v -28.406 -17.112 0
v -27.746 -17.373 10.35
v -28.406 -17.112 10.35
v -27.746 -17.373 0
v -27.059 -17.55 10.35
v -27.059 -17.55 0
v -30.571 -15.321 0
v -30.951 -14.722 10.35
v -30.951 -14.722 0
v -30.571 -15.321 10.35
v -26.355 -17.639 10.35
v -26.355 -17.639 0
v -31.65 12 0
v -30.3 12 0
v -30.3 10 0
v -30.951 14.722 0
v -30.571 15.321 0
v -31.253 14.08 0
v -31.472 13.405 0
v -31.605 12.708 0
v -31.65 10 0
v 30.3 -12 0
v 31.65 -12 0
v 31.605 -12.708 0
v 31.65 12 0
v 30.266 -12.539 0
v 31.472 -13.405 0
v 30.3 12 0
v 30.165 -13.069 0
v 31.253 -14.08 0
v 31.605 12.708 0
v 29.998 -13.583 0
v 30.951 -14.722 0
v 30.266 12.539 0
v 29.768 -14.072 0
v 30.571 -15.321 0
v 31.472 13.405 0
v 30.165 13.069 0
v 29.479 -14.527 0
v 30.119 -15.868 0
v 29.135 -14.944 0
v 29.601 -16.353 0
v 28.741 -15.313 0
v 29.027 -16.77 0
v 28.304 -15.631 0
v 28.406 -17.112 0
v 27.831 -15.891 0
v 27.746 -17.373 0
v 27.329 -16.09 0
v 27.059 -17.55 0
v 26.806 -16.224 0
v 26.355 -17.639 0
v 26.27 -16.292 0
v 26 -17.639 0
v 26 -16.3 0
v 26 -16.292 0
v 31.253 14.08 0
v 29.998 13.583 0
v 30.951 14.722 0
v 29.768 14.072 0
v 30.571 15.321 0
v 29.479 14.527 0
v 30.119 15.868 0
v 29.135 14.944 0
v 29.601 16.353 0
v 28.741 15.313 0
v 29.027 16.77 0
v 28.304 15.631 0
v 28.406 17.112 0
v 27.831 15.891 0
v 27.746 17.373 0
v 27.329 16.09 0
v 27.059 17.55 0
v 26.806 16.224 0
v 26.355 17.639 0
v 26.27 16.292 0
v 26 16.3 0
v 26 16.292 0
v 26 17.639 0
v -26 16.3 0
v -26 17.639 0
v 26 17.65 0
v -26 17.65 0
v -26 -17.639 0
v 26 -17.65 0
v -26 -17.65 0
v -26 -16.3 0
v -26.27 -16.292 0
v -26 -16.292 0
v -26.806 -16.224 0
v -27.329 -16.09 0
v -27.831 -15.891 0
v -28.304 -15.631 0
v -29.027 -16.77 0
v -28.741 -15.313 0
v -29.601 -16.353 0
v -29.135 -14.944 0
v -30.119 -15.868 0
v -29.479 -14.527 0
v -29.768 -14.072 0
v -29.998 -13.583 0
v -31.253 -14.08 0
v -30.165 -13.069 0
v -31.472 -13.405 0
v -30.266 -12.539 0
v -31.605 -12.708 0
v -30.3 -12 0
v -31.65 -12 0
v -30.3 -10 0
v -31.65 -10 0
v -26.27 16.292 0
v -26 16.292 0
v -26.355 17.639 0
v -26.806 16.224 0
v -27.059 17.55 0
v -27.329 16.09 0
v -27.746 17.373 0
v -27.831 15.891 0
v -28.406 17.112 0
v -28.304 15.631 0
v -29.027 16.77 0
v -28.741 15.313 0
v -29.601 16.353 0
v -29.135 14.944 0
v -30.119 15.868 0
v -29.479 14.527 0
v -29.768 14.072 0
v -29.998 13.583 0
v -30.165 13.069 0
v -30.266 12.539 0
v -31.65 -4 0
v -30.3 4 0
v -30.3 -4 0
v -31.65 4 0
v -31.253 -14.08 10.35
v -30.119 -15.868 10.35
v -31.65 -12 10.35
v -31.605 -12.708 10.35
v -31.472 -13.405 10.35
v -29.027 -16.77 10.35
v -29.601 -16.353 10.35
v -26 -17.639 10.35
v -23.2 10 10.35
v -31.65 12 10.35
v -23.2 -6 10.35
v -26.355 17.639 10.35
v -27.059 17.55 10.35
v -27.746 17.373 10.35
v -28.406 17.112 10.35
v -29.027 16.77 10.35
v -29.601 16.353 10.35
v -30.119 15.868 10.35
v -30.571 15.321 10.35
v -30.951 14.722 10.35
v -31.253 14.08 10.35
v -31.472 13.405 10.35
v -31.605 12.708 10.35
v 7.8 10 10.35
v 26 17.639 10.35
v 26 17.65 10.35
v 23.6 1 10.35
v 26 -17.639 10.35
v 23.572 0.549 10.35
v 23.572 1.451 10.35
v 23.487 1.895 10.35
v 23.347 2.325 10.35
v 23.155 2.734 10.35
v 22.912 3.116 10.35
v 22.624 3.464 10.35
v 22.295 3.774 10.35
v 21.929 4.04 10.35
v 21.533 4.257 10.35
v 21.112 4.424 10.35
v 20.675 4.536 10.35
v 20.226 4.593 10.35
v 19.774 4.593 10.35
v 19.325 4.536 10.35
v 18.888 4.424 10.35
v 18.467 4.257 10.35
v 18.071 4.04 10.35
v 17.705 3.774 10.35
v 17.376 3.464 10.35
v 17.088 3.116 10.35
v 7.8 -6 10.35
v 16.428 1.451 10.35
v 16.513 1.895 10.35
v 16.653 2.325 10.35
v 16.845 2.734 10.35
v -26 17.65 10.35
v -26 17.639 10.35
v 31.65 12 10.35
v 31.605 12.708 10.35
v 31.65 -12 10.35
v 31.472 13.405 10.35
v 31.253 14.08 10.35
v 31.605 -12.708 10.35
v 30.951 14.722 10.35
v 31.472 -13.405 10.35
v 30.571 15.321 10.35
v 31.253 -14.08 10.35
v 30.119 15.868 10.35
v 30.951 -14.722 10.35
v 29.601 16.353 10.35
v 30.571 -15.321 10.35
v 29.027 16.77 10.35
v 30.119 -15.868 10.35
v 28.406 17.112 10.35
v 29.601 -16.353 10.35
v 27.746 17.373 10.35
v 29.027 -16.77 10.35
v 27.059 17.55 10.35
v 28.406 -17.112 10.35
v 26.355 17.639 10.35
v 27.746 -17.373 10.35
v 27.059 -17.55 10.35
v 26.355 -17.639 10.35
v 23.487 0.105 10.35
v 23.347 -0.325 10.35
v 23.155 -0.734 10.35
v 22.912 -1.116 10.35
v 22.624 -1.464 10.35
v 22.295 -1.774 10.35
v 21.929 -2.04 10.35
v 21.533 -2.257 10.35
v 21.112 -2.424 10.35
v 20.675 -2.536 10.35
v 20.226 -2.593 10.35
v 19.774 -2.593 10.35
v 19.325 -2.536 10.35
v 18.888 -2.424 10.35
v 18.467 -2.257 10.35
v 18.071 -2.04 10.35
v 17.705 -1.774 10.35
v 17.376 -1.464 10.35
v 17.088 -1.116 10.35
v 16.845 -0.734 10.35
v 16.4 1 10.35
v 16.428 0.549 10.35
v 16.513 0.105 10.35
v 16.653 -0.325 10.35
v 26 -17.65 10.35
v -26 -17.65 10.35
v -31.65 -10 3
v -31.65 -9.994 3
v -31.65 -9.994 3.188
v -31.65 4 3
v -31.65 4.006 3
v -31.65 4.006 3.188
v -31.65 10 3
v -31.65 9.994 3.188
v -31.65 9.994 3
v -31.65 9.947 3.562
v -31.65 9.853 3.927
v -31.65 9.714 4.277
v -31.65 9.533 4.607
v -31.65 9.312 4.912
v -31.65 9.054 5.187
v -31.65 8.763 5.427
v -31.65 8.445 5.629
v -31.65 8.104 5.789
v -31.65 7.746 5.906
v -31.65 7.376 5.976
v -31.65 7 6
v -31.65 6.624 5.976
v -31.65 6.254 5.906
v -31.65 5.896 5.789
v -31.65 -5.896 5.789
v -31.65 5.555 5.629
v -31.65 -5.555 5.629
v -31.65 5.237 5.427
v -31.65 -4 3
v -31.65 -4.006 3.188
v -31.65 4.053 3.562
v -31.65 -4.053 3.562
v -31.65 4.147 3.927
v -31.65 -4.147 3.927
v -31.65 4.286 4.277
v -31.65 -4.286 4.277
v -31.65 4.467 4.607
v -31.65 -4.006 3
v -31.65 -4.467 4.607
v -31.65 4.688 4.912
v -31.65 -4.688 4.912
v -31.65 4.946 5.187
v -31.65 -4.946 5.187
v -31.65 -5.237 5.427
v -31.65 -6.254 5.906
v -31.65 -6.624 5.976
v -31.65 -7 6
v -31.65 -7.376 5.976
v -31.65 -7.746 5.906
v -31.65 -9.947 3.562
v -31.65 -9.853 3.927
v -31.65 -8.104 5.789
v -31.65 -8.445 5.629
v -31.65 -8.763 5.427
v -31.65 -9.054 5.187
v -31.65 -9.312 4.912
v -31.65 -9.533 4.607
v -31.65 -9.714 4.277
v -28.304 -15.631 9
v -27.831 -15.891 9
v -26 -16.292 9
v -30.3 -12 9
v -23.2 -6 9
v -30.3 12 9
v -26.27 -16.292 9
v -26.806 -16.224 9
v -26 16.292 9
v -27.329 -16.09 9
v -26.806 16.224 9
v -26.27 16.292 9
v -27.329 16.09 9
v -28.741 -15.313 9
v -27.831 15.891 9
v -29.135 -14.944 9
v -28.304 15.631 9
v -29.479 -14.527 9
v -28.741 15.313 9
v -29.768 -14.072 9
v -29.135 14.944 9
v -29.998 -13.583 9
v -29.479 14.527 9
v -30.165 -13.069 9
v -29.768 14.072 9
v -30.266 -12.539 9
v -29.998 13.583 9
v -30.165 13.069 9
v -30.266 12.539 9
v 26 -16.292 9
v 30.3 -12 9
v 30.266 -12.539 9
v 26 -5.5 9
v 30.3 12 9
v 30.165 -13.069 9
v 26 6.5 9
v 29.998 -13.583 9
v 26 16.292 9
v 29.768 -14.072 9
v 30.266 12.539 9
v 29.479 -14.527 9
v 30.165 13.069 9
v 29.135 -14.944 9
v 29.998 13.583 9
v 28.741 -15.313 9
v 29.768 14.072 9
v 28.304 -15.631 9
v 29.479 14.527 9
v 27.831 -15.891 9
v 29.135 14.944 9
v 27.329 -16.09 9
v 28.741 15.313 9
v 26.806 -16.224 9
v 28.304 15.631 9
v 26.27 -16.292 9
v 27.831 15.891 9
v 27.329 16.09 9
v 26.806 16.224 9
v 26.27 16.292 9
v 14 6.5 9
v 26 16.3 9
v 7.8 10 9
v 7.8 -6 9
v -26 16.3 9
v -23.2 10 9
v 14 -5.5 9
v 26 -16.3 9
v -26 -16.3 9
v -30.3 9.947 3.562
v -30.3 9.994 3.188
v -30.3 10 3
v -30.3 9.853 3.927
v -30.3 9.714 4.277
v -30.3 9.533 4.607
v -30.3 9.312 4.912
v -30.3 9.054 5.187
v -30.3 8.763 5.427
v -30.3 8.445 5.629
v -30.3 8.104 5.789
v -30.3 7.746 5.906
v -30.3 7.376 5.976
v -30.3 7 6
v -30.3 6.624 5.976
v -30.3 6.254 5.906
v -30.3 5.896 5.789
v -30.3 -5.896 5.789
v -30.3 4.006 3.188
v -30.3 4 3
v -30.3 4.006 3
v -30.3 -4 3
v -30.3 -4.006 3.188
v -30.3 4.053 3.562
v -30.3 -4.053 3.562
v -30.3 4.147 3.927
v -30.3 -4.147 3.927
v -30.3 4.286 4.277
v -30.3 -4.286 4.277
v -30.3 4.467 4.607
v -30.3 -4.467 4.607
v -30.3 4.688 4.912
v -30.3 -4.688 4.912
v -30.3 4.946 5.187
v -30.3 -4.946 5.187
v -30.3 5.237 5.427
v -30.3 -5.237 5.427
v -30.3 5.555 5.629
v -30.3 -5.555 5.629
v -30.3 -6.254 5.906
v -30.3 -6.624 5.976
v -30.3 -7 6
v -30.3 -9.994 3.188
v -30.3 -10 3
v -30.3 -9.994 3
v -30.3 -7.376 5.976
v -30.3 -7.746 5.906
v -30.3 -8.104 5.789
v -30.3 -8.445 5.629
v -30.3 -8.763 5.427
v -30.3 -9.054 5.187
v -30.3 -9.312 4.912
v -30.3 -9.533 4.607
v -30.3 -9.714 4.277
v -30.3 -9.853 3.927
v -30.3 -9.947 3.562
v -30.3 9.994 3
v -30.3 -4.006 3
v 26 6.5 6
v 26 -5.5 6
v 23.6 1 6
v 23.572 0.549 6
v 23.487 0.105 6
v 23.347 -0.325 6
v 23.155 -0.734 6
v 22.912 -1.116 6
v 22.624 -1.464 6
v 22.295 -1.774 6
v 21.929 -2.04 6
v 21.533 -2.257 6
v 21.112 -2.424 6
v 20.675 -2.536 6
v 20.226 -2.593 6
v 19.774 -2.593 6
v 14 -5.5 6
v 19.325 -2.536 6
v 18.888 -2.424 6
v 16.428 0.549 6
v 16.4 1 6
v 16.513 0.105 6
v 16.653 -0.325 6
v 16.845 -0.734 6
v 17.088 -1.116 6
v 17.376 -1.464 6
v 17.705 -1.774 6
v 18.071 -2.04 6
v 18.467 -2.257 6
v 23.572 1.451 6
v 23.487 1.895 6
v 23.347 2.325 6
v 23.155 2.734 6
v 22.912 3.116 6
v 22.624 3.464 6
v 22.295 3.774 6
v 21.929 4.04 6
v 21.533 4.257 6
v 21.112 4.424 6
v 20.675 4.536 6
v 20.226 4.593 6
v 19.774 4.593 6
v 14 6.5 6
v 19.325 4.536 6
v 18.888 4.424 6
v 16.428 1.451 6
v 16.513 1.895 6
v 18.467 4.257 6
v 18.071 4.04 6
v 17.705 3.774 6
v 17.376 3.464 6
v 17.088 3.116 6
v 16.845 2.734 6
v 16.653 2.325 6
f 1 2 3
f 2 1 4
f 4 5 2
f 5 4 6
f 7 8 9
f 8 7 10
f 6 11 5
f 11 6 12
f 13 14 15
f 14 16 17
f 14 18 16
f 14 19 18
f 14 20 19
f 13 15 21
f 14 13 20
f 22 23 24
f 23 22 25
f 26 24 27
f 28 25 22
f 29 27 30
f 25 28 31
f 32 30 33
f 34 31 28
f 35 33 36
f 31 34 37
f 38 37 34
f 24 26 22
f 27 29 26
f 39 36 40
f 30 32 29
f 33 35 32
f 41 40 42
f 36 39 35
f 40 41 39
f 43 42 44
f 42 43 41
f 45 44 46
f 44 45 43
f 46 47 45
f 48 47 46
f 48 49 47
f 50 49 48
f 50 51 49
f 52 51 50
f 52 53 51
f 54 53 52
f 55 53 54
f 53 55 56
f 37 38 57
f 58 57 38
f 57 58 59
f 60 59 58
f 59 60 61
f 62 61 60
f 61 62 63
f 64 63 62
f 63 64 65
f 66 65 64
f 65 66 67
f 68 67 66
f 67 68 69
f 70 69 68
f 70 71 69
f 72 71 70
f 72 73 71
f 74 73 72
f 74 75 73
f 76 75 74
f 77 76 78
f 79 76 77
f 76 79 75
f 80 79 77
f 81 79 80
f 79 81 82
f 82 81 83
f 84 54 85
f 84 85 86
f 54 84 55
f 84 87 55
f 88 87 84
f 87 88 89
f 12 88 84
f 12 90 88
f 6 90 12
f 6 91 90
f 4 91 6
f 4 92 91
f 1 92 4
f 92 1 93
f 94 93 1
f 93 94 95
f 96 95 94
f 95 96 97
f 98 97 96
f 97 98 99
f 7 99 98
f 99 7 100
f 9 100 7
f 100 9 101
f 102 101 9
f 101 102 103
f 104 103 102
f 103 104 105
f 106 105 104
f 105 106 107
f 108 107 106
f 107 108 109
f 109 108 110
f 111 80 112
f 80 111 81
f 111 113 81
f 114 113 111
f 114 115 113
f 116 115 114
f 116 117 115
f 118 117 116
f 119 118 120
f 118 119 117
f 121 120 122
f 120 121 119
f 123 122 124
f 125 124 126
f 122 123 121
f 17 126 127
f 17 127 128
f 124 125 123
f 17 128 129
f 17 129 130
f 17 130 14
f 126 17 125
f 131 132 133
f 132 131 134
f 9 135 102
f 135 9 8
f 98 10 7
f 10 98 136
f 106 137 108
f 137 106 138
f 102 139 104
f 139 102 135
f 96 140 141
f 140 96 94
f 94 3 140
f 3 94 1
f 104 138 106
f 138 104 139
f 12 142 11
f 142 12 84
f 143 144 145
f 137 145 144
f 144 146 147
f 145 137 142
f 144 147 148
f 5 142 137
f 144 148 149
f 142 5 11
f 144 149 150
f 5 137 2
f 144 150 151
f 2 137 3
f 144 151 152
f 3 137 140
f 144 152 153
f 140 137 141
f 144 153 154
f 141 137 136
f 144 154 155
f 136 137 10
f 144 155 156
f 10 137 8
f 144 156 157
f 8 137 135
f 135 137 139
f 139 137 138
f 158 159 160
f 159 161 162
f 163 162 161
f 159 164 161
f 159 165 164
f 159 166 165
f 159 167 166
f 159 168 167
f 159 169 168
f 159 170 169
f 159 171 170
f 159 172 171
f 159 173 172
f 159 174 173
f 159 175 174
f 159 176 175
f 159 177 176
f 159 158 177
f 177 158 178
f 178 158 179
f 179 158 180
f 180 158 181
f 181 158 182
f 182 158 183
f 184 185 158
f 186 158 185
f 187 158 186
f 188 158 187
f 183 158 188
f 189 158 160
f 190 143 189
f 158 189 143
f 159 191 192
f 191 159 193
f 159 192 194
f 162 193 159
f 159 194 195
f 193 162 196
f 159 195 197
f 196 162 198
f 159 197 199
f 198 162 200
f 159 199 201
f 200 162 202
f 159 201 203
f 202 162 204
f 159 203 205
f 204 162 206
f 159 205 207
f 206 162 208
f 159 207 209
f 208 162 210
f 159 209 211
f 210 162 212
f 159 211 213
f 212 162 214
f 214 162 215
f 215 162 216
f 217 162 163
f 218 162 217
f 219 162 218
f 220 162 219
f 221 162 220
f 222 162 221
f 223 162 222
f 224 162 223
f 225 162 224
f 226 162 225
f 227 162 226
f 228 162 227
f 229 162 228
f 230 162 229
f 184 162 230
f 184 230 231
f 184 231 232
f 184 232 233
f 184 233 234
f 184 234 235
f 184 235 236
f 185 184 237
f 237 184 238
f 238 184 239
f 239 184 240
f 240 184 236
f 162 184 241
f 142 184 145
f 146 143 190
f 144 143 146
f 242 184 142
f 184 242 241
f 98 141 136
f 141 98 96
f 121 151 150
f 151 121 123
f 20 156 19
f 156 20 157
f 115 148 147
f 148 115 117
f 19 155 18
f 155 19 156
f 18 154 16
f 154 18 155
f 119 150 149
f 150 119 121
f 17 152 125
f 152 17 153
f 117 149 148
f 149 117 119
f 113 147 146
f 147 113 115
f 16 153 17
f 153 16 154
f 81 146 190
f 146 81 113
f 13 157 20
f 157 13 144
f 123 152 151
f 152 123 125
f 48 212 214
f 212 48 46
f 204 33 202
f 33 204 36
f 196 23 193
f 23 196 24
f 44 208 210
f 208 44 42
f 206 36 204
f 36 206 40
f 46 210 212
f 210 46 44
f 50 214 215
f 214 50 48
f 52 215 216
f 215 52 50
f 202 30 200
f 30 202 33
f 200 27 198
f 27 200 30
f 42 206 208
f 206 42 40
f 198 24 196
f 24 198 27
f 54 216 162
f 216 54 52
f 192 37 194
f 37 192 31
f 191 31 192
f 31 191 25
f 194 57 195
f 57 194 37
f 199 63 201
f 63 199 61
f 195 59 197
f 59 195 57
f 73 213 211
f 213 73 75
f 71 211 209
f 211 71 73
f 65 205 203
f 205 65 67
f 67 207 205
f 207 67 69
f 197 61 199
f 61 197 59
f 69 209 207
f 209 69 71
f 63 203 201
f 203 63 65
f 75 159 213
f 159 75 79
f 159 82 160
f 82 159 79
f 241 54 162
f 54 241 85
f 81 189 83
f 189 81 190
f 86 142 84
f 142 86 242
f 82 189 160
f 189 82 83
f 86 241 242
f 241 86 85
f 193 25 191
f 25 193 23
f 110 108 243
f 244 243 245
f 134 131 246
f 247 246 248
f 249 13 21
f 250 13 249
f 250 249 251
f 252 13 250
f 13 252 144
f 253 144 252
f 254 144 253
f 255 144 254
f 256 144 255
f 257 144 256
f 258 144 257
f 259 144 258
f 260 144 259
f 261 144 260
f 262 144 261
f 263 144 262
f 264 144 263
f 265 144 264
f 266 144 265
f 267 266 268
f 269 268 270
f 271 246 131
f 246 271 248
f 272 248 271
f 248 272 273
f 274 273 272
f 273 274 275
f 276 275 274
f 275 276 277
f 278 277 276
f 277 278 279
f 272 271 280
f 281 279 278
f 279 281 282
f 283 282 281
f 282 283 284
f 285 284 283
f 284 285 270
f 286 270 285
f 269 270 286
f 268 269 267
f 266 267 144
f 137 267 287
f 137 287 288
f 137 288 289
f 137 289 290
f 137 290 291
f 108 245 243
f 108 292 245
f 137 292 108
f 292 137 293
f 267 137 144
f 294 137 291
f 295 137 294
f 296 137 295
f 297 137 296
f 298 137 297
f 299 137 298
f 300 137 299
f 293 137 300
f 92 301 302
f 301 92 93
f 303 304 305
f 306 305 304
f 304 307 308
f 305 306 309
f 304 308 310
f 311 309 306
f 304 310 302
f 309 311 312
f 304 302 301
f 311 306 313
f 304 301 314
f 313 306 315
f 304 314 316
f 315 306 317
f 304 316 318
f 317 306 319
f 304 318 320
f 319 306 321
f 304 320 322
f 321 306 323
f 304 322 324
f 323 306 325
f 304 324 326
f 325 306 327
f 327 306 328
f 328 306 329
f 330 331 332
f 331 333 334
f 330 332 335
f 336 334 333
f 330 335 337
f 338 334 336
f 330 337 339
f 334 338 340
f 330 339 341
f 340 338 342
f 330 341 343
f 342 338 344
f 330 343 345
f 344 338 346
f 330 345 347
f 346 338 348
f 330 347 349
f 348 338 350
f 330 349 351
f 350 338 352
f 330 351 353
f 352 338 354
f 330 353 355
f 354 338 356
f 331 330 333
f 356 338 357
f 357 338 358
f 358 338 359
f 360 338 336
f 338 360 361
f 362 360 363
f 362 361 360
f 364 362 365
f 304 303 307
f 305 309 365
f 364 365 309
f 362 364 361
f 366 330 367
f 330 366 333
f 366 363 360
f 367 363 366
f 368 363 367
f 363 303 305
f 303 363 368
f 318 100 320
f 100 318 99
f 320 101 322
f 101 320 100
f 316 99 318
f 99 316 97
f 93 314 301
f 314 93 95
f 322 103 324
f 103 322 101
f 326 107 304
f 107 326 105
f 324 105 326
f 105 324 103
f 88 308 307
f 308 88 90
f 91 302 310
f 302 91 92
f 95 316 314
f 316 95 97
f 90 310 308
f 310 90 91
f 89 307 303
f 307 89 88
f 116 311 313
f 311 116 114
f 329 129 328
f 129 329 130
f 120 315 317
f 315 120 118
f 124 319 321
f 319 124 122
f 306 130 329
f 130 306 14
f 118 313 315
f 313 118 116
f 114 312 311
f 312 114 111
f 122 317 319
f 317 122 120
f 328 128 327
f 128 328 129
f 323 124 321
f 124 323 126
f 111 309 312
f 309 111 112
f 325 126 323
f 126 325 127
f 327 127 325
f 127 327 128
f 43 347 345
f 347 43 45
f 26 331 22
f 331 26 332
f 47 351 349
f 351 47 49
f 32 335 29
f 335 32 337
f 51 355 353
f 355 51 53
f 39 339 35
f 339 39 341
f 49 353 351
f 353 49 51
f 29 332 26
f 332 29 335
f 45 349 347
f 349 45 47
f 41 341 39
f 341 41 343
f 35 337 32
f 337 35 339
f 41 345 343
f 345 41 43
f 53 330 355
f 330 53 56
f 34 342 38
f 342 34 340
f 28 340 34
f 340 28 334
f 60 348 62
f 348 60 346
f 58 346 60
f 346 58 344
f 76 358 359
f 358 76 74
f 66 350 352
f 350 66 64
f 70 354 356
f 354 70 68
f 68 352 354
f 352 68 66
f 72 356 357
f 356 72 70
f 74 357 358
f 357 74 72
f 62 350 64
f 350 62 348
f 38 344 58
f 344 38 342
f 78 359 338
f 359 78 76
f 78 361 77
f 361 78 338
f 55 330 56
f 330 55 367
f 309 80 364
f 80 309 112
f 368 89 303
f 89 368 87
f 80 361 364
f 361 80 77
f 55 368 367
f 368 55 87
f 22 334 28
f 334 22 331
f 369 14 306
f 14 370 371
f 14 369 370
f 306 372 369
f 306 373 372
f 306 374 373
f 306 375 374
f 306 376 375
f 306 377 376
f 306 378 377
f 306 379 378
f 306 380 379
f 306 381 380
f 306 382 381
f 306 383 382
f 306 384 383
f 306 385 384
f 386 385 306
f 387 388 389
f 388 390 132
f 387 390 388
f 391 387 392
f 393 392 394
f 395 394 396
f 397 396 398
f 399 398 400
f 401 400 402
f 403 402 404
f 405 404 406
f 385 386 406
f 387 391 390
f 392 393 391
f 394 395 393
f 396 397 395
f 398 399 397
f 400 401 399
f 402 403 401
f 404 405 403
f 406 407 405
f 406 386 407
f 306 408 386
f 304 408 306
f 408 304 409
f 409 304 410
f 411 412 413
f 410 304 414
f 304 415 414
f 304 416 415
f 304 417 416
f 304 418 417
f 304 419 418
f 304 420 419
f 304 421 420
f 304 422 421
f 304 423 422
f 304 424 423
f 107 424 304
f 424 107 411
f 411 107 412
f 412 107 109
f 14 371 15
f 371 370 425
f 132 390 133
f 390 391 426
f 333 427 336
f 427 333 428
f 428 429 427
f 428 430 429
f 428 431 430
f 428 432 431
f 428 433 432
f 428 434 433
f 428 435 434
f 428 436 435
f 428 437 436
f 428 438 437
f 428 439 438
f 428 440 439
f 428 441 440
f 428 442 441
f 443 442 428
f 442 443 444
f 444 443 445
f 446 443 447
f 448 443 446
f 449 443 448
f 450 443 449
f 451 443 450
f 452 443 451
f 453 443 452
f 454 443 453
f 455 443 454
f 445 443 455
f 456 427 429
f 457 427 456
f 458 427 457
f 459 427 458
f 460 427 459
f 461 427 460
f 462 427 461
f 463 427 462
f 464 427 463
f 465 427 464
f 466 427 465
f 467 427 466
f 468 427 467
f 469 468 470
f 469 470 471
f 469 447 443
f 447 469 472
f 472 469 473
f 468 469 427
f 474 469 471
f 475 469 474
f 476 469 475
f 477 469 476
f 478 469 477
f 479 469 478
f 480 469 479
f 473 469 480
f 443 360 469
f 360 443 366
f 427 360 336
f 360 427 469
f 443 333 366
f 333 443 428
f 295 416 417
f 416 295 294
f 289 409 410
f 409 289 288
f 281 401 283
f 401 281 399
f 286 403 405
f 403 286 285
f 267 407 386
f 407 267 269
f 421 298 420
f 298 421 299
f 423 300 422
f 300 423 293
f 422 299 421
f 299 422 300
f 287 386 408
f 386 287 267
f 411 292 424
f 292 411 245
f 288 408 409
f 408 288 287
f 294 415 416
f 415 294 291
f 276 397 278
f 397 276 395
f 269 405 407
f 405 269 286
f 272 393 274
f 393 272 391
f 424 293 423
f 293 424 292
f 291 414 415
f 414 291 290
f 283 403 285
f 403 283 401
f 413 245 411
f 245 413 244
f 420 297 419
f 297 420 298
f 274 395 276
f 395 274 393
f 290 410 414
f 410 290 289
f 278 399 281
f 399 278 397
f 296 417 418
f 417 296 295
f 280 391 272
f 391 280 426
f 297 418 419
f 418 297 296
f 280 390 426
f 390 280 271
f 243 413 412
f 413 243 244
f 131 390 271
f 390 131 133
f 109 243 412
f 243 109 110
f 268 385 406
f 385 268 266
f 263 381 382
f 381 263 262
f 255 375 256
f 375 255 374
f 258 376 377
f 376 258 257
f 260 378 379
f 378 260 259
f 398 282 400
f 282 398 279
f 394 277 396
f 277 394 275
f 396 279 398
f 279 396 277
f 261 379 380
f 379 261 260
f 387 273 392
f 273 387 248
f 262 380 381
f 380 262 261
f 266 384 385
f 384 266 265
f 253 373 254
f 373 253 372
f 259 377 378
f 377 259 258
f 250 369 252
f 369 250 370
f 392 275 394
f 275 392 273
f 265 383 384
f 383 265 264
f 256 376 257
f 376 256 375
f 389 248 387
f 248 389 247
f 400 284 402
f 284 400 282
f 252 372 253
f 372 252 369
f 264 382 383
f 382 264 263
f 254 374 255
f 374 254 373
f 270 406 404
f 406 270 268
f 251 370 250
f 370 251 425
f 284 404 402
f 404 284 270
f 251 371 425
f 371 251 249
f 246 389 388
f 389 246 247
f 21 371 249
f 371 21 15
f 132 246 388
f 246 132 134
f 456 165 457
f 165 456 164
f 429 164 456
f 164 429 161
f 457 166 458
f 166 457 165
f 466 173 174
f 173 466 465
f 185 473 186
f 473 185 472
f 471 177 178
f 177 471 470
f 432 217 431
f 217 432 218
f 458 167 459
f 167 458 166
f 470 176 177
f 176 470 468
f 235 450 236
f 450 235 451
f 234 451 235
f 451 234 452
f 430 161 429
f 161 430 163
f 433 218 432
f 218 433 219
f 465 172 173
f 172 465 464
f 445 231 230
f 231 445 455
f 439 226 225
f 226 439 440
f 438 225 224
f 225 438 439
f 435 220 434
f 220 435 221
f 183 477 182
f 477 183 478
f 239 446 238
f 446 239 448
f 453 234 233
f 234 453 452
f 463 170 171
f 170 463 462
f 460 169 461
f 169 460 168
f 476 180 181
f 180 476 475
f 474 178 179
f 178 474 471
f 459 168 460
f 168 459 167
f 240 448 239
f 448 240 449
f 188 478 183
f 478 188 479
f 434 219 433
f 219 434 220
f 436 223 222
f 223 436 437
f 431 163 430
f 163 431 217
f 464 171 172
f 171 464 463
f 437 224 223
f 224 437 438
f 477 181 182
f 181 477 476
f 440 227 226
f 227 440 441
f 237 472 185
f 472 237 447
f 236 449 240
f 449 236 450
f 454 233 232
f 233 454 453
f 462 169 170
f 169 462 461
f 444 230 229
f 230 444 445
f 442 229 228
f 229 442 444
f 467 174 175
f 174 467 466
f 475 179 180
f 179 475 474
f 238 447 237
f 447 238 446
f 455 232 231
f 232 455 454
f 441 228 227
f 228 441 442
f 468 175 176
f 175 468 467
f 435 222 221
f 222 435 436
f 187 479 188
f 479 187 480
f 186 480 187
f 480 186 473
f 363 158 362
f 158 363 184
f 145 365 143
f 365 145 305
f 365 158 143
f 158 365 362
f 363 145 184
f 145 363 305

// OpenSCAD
// file: rounded_box.scad
module rounded_box(w,d,h,r)
{
	union(){
		translate([-w/2+r, -d/2+r, 0]) cylinder(h, r, r);
		translate([-w/2+r, d/2-r, 0]) cylinder(h, r, r);
		translate([w/2-r, -d/2+r, 0]) cylinder(h, r, r);
		translate([w/2-r, d/2-r, 0]) cylinder(h, r, r);
		
		translate([-w/2+r, -d/2, 0]) cube([w-r*2,d,h]);
		translate([-w/2, -d/2+r, 0]) cube([w,d-r*2,h]);
	}
}
// main file
use <rounded_box.scad>

$fn=50;

w=60;
d=32;
h=1.6;
r=4;

o=.3;
t=0.45*3;
th=9;
i=2.54;

difference() {
	
	union () {
		
		rd = 2.5;

		difference()
		{		
			rounded_box(
				o+o+w+t+t,
				o+o+d+t+t,
				th+t,
				r+o+t
			);
			
			// first stage pcb rim
			translate([0,0,-1])
			rounded_box(
				w+o+o,
				d+o+o,
				th+1,
				r+o
			);
			
			
			// display 10.5 
		}
		
		
		translate([-6 + 20, -6 + .5, th-3])
		cube([12, 12, 3]);
		
	}
	
	// knob
	translate([20, 0 + 1, 0])
	cylinder(30, 3.6, 3.6);
	
	// display
	translate([-31/2 - 7.7, -16/2 + 2, 0])
	cube([31, 16, 20]);


	// plug openings
	translate([0,-7,3]) {
		
	rotate([0,270,0])
	cylinder(40,3,3);
	
	translate([-40, -3, -6])
	cube([40, 6, 6]);
	}

	// plug openings
	translate([0,7,3]) {
		
	rotate([0,270,0])
	cylinder(40,3,3);
	
	translate([-40, -3, -6])
	cube([40, 6, 6]);
	}
	
}

if($preview && 0) {
	color("black", 0.9) rounded_box(w,d,h,r);
}

module usbSocket() {
	usb = 9;
	color("red", 0.2)
	translate([-usb/2,d/2-usb/2,-usb+th-h])
	cube(usb);
	
	usb2 = 32;
	color("red", 0.2)
	translate([-usb2/2,d/2-usb2+o,-usb2+th-h])
	cube(usb2);
	
}
